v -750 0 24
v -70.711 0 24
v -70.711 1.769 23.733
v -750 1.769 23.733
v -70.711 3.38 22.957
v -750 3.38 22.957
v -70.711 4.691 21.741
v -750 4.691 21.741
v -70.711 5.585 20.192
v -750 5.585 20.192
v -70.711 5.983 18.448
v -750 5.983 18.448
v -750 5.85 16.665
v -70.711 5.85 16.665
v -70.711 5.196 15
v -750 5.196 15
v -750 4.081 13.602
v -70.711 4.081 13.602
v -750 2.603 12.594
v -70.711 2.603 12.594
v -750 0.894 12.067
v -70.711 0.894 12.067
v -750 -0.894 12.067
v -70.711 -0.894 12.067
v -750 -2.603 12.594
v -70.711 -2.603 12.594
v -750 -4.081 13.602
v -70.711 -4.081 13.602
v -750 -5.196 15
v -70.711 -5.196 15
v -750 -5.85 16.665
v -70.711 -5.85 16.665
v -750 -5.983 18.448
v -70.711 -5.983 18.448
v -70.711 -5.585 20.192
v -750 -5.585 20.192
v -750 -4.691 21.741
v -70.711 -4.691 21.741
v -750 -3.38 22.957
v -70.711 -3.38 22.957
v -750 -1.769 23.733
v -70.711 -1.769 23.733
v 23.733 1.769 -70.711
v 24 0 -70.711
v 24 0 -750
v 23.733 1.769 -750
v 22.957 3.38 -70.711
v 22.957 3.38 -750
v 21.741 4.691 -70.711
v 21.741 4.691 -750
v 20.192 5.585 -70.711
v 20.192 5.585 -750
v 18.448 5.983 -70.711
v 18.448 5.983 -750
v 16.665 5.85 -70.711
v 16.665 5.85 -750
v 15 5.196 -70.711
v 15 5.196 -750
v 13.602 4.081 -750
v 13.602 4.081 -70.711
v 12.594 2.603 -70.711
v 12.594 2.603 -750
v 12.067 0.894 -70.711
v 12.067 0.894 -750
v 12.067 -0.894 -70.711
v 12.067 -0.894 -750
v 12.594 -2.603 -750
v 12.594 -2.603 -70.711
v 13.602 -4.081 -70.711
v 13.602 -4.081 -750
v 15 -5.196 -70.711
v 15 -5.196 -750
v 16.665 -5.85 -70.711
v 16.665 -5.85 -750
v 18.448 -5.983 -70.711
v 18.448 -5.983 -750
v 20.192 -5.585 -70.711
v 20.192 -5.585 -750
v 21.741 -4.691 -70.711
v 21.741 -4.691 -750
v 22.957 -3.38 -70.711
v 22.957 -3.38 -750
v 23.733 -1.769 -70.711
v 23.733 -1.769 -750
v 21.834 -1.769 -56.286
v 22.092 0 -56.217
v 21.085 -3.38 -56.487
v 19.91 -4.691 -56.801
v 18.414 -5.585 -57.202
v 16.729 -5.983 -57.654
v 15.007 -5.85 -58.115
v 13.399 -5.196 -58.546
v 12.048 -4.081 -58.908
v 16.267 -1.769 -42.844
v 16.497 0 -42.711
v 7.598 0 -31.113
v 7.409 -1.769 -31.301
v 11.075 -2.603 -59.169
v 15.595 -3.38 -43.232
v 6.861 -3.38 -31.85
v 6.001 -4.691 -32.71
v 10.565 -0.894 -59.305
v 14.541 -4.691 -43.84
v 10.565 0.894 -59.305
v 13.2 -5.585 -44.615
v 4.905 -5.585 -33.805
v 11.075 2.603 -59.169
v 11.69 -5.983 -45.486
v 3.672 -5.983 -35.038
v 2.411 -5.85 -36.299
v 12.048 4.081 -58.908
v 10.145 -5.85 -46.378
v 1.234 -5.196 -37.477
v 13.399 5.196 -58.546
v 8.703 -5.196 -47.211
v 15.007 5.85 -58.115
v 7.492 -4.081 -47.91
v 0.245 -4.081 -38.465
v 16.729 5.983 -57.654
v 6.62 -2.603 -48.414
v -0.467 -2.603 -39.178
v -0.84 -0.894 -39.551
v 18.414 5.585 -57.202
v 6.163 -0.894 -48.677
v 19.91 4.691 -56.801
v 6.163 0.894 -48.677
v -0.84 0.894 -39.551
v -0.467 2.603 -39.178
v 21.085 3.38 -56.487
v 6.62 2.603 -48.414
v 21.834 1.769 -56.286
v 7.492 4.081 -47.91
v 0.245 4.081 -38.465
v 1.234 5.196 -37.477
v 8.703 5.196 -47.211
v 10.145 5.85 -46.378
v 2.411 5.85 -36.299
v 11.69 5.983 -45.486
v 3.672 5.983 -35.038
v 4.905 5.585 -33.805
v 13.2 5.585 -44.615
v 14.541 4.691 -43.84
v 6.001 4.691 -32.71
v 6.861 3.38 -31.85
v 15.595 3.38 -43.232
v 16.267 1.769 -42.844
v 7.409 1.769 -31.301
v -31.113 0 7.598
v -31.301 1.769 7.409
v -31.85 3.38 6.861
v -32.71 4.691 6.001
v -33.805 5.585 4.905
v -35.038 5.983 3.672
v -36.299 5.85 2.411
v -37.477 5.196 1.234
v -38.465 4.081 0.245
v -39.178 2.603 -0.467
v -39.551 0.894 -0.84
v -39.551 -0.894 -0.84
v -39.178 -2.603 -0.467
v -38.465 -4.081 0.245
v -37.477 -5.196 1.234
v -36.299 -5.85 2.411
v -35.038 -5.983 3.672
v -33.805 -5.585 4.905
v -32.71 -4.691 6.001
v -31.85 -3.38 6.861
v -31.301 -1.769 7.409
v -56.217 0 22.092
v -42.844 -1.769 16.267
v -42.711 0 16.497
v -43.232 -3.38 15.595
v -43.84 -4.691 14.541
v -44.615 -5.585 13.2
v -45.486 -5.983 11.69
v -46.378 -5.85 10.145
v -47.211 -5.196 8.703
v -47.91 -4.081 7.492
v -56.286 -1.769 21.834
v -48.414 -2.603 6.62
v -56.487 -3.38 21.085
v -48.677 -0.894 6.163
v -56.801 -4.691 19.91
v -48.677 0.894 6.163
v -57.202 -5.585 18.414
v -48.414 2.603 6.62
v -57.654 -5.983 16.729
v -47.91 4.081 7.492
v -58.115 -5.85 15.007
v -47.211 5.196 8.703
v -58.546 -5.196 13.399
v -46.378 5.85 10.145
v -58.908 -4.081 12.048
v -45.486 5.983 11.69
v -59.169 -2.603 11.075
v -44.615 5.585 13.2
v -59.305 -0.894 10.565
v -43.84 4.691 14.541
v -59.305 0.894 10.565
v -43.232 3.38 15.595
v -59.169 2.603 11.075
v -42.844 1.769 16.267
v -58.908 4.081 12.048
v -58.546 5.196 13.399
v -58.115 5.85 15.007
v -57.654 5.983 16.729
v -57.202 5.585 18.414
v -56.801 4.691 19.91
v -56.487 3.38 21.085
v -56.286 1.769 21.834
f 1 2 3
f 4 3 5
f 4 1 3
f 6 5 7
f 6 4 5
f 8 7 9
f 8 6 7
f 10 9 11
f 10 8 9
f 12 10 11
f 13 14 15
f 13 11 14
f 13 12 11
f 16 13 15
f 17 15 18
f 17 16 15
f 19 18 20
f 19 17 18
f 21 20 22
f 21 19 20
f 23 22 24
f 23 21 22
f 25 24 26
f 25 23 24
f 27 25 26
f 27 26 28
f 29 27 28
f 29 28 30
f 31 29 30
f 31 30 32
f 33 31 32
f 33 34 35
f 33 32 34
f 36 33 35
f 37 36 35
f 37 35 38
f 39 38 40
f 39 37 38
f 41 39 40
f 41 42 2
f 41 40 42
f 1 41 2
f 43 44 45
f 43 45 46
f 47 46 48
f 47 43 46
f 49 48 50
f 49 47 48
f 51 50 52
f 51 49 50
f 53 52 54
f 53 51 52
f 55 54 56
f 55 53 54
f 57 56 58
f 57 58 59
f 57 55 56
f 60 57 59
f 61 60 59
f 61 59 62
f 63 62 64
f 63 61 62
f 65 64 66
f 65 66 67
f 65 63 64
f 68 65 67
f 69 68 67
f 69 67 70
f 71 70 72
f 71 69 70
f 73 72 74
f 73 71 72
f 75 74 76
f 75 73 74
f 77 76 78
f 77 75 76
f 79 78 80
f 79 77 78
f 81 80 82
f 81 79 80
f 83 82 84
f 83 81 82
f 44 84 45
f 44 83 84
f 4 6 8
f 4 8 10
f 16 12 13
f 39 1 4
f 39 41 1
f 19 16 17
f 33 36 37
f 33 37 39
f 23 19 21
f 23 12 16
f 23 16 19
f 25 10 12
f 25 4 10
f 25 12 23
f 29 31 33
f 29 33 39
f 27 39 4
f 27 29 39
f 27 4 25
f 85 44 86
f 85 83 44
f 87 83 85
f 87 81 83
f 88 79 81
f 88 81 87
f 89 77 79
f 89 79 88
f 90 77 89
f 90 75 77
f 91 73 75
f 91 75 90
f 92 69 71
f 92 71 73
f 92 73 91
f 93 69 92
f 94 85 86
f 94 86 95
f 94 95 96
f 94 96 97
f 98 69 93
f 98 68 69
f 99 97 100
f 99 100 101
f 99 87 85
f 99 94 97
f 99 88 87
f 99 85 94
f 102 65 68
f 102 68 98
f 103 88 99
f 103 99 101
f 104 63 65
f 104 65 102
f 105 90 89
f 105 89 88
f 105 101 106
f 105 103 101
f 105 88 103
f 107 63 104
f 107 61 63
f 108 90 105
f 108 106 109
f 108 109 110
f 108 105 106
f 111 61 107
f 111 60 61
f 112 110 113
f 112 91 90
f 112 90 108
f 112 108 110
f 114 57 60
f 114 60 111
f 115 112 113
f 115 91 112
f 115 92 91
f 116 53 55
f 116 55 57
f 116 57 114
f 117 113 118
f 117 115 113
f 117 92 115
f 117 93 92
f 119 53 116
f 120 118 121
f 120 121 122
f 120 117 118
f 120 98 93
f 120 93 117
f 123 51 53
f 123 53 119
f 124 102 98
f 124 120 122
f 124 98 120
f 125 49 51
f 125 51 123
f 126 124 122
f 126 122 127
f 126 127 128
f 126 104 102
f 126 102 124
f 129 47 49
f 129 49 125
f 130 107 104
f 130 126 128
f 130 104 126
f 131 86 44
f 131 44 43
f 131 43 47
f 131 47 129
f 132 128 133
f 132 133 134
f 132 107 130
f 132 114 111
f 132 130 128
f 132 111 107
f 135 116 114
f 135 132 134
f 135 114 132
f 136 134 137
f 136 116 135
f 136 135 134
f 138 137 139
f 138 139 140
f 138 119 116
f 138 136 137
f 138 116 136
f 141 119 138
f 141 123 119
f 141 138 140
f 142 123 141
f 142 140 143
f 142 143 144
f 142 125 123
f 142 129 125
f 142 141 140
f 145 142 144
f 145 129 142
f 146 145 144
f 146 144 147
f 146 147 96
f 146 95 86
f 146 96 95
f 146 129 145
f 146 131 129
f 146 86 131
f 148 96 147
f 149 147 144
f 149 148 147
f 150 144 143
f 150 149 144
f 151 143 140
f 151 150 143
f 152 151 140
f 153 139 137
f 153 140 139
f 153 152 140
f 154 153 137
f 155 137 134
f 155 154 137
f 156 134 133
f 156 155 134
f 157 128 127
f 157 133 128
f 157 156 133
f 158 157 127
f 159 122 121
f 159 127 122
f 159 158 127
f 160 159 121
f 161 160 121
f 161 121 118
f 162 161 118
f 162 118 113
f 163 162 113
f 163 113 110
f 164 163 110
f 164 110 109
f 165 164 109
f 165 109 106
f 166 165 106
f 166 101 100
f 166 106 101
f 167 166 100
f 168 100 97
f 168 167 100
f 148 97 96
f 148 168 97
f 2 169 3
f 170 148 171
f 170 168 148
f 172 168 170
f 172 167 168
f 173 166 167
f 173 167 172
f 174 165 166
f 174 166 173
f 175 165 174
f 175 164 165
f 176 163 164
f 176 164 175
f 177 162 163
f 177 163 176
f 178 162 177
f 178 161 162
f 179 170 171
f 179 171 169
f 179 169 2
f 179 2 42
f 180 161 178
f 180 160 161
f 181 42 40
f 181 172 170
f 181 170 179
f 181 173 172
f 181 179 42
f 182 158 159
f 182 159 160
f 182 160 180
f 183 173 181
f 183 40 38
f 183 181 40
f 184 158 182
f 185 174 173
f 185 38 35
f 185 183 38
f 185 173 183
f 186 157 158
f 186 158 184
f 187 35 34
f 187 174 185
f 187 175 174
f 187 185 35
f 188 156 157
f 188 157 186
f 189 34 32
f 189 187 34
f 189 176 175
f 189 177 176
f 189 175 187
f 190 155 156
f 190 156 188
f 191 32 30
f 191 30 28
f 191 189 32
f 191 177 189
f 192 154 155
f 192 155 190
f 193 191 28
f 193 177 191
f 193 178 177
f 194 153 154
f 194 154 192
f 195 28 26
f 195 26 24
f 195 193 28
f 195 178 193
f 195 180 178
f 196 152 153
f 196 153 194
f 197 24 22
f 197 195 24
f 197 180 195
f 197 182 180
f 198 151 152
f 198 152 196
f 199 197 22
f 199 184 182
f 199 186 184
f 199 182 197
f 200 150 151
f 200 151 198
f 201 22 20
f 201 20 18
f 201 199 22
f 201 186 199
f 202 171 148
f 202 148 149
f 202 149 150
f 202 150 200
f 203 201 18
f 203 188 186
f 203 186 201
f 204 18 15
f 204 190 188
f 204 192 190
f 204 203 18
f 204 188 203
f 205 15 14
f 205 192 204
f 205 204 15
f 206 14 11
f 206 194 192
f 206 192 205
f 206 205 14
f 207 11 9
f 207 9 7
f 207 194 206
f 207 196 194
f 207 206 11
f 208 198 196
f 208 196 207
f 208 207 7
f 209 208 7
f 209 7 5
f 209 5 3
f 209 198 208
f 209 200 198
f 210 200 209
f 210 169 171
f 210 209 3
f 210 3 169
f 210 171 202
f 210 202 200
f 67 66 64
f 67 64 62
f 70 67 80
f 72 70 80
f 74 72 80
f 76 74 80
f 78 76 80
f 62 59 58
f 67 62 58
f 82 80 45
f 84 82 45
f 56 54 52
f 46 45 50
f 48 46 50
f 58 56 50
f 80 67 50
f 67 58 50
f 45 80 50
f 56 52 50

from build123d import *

# Parameters (mm, degrees)
SKETCH_2_R = 6


with BuildPart() as part:
    # По траектории1: sweep along a path in Эскиз1
    with BuildLine(Plane(origin=(0, 0, 0), x_dir=(1, 0, 0), z_dir=(0, 1, 0))) as sweep_1_path:
        Line((18, 750), (18, 70.710678119))
        ThreePointArc((18, 70.710678119), (14.193976626, 51.5765065), (3.355339059, 35.355339059))
        Line((3.355339059, 35.355339059), (-35.355339059, -3.355339059))
        ThreePointArc((-35.355339059, -3.355339059), (-51.5765065, -14.193976626), (-70.710678119, -18))
        Line((-70.710678119, -18), (-750, -18))
    # Эскиз2 → По траектории1 (sweep)
    with BuildSketch(Plane(origin=(-750, -400, -12), x_dir=(0, 0, 1), z_dir=(-1, 0, 0))):
        with Locations((30, 400)):
            Circle(SKETCH_2_R)
    sweep(path=sweep_1_path.line)


solid = part.part
